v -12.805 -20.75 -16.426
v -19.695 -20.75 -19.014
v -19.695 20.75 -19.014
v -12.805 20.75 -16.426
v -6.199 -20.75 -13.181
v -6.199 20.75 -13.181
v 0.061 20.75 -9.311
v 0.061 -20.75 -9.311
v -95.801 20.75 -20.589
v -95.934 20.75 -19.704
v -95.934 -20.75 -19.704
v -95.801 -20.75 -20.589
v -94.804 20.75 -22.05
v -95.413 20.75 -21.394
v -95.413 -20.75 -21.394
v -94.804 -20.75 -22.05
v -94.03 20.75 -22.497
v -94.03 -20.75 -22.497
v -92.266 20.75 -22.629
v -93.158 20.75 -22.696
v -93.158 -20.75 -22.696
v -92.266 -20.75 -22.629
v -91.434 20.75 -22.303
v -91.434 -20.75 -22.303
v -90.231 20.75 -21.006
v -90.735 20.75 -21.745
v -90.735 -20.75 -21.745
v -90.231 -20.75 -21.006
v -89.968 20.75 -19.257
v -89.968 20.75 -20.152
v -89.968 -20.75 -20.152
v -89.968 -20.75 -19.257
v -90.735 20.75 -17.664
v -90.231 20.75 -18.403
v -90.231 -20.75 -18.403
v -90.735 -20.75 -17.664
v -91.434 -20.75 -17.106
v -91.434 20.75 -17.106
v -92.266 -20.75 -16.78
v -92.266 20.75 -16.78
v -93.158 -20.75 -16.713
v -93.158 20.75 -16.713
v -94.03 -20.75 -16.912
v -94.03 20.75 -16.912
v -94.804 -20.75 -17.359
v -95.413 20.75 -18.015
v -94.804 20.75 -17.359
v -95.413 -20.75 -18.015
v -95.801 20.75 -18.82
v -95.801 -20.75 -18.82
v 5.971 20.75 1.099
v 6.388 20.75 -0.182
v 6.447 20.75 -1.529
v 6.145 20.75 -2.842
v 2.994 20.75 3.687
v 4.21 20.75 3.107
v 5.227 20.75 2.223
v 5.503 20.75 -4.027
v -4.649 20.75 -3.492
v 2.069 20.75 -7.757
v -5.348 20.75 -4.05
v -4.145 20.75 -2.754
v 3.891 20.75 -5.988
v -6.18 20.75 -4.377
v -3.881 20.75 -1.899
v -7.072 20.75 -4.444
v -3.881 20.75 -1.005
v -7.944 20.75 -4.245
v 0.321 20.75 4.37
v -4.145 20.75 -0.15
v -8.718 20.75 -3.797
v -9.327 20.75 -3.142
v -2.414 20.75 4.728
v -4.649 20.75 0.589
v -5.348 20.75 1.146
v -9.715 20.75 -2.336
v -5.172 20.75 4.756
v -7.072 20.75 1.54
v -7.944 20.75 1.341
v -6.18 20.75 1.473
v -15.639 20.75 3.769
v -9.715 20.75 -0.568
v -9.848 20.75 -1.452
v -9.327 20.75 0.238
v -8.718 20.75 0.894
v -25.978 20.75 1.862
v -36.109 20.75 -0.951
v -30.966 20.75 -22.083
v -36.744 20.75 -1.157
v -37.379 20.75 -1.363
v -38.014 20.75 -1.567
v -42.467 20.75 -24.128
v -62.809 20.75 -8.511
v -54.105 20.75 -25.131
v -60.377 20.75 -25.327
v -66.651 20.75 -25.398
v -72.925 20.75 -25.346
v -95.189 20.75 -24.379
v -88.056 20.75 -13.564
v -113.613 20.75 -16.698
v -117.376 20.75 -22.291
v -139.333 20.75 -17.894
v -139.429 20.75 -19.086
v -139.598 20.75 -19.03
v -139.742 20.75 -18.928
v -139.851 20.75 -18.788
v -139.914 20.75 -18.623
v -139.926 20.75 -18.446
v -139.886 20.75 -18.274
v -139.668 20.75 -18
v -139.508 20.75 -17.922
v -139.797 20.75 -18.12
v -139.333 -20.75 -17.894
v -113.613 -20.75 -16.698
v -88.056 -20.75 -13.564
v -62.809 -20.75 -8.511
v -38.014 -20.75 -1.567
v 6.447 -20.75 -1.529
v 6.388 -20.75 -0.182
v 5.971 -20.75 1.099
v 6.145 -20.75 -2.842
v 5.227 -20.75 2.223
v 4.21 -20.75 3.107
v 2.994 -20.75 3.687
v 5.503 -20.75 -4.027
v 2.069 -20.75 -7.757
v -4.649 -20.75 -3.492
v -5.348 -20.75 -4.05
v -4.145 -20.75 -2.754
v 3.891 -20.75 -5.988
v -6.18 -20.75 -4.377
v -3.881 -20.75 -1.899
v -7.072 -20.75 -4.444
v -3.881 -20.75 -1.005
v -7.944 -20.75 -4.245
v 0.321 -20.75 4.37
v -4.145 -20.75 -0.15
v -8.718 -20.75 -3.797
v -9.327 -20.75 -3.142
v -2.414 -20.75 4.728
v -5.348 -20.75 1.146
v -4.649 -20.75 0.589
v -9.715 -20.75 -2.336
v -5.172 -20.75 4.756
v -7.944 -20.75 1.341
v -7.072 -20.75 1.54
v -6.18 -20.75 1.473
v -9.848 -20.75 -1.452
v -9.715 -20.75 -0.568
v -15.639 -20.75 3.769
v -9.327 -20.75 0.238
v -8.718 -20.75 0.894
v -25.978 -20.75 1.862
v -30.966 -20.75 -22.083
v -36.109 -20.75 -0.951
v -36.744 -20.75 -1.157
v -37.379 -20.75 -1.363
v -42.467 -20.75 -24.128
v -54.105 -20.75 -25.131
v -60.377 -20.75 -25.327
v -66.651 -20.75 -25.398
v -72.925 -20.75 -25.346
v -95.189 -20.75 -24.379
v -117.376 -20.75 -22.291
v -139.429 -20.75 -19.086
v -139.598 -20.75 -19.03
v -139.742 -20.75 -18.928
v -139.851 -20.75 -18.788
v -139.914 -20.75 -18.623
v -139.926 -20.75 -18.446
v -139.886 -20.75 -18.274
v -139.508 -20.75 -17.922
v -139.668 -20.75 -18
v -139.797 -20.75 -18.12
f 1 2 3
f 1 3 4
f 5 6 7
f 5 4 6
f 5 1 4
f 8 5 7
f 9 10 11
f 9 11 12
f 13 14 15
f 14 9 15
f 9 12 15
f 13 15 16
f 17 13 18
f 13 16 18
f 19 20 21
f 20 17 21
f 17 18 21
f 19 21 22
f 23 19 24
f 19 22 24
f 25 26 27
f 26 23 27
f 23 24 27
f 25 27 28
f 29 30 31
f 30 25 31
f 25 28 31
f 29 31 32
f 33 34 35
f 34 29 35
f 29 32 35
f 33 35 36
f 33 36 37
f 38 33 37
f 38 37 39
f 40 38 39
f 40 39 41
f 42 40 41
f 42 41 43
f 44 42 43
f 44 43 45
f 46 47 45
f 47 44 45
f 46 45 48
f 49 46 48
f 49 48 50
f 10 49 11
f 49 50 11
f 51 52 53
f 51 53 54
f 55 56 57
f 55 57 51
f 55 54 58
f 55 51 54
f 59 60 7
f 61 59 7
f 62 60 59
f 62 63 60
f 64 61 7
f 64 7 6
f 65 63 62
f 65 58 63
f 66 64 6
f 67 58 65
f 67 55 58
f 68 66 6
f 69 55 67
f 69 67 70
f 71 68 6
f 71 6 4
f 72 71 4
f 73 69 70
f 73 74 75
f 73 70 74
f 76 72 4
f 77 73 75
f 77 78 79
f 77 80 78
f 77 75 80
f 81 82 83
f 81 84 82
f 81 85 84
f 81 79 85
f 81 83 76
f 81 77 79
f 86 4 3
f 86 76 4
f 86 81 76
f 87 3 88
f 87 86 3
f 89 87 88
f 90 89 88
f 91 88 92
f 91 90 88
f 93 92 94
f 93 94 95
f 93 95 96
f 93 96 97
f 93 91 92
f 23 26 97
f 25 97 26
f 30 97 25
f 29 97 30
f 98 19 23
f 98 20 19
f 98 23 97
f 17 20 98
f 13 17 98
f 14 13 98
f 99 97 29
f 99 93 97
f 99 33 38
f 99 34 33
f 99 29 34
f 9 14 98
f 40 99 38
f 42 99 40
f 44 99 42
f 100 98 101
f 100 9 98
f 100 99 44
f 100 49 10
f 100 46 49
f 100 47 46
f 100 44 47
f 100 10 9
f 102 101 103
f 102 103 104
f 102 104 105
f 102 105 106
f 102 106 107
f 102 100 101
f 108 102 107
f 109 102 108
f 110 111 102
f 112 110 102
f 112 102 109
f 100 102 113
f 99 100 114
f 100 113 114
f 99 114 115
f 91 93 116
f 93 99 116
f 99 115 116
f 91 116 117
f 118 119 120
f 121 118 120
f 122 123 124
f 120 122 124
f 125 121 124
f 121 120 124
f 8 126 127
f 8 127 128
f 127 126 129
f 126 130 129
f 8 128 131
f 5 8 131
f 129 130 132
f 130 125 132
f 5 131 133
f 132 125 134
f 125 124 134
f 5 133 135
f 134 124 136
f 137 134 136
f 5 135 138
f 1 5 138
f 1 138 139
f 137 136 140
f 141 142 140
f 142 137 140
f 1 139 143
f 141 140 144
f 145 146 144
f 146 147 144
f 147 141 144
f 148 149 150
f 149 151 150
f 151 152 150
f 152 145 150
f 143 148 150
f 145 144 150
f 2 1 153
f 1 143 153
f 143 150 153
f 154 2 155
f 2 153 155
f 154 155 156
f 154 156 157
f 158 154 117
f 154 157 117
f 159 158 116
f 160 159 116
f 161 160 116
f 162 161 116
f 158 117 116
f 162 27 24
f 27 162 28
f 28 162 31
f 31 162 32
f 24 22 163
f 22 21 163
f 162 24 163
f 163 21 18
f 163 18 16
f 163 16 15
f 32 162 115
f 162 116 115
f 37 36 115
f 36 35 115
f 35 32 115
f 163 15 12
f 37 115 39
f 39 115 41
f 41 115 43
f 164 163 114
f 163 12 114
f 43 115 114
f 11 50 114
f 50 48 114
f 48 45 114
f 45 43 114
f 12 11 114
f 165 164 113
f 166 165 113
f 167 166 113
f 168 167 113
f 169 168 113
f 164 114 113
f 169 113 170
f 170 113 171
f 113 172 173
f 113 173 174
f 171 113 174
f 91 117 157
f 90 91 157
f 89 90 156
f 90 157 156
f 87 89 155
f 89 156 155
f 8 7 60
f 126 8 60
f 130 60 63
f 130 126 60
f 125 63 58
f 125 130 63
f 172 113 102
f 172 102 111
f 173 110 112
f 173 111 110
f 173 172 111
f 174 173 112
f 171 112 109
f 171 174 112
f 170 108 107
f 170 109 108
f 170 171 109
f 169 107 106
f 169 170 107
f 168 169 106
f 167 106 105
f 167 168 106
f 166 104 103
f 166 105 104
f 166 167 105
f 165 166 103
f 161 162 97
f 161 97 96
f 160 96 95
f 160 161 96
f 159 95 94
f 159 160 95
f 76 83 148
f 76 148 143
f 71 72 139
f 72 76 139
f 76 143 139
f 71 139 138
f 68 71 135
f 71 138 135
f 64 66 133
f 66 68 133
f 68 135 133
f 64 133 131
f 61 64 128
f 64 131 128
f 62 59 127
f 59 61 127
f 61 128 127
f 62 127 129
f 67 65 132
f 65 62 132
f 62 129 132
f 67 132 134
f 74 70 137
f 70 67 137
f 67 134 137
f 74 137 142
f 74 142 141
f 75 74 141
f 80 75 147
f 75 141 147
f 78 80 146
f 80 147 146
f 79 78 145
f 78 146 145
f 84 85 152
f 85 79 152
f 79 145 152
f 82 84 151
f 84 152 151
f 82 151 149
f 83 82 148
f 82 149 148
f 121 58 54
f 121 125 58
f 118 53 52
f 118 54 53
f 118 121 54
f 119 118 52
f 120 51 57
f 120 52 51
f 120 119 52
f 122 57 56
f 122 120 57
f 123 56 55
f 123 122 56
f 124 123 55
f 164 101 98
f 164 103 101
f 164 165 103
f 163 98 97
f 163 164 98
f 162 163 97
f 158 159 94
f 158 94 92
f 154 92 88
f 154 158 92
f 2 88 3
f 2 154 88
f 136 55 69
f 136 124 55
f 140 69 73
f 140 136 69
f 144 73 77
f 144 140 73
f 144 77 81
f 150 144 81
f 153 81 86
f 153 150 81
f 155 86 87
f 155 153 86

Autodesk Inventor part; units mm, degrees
ref_plane "YZ Plane" through (0, 0, 0) normal (1, 0, 0) x (0, 1, 0)
ref_plane "XZ Plane" through (0, 0, 0) normal (0, 1, 0) x (-1, 0, 0)
ref_plane "XY Plane" through (0, 0, 0) normal (0, 0, 1) x (1, 0, 0)
sketch "スケッチ1" plane through (0, 0, 0) normal (0, 1, 0) x (-1, 0, 0)
  arc A0 (72.9254, -25.3463) -> (139.4294, -19.0858) centre (64.9013, 416.2515) ccw projected
  arc A1 (54.1052, -25.1311) -> (72.9254, -25.3463) centre (67.1484, 292.5868) ccw projected
  arc A2 (19.6951, -19.0145) -> (54.1052, -25.1311) centre (59.4352, 104.7024) ccw projected
  arc A3 (-0.0609, -9.311) -> (19.6951, -19.0145) centre (42.8692, 53.13) ccw projected
  arc A4 (-5.5029, -4.0266) -> (-0.0609, -9.311) centre (12.76, 9.3368) ccw projected
  arc A5 (-2.9938, 3.6874) -> (-5.5029, -4.0266) centre (-1.4678, -1.074) ccw projected
  arc A6 (5.1717, 4.7562) -> (-2.9938, 3.6874) centre (4.0256, -18.2153) ccw projected
  arc A7 (36.109, -0.9508) -> (5.1717, 4.7562) centre (-0.7578, -114.096) ccw projected
  arc A8 (36.109, -0.9508) -> (38.0145, -1.5673) centre (185.125, 456.3841) ccw projected
  arc A9 (38.0145, -1.5673) -> (139.3334, -17.8944) centre (142.307, 323.0926) ccw projected
  arc A10 (139.4294, -19.0858) -> (139.3334, -17.8944) centre (139.3282, -18.4944) ccw projected
  circle A11 centre (6.8478, -1.4519) radius 3 projected
  circle A12 centre (92.934, -19.7045) radius 3 projected
  point P0 (0, 0)
extrude "押し出し1" add sketch "スケッチ1" along normal mid plane 41.5
properties part number "uretan_s" material "ポリエチレン、高密度"
